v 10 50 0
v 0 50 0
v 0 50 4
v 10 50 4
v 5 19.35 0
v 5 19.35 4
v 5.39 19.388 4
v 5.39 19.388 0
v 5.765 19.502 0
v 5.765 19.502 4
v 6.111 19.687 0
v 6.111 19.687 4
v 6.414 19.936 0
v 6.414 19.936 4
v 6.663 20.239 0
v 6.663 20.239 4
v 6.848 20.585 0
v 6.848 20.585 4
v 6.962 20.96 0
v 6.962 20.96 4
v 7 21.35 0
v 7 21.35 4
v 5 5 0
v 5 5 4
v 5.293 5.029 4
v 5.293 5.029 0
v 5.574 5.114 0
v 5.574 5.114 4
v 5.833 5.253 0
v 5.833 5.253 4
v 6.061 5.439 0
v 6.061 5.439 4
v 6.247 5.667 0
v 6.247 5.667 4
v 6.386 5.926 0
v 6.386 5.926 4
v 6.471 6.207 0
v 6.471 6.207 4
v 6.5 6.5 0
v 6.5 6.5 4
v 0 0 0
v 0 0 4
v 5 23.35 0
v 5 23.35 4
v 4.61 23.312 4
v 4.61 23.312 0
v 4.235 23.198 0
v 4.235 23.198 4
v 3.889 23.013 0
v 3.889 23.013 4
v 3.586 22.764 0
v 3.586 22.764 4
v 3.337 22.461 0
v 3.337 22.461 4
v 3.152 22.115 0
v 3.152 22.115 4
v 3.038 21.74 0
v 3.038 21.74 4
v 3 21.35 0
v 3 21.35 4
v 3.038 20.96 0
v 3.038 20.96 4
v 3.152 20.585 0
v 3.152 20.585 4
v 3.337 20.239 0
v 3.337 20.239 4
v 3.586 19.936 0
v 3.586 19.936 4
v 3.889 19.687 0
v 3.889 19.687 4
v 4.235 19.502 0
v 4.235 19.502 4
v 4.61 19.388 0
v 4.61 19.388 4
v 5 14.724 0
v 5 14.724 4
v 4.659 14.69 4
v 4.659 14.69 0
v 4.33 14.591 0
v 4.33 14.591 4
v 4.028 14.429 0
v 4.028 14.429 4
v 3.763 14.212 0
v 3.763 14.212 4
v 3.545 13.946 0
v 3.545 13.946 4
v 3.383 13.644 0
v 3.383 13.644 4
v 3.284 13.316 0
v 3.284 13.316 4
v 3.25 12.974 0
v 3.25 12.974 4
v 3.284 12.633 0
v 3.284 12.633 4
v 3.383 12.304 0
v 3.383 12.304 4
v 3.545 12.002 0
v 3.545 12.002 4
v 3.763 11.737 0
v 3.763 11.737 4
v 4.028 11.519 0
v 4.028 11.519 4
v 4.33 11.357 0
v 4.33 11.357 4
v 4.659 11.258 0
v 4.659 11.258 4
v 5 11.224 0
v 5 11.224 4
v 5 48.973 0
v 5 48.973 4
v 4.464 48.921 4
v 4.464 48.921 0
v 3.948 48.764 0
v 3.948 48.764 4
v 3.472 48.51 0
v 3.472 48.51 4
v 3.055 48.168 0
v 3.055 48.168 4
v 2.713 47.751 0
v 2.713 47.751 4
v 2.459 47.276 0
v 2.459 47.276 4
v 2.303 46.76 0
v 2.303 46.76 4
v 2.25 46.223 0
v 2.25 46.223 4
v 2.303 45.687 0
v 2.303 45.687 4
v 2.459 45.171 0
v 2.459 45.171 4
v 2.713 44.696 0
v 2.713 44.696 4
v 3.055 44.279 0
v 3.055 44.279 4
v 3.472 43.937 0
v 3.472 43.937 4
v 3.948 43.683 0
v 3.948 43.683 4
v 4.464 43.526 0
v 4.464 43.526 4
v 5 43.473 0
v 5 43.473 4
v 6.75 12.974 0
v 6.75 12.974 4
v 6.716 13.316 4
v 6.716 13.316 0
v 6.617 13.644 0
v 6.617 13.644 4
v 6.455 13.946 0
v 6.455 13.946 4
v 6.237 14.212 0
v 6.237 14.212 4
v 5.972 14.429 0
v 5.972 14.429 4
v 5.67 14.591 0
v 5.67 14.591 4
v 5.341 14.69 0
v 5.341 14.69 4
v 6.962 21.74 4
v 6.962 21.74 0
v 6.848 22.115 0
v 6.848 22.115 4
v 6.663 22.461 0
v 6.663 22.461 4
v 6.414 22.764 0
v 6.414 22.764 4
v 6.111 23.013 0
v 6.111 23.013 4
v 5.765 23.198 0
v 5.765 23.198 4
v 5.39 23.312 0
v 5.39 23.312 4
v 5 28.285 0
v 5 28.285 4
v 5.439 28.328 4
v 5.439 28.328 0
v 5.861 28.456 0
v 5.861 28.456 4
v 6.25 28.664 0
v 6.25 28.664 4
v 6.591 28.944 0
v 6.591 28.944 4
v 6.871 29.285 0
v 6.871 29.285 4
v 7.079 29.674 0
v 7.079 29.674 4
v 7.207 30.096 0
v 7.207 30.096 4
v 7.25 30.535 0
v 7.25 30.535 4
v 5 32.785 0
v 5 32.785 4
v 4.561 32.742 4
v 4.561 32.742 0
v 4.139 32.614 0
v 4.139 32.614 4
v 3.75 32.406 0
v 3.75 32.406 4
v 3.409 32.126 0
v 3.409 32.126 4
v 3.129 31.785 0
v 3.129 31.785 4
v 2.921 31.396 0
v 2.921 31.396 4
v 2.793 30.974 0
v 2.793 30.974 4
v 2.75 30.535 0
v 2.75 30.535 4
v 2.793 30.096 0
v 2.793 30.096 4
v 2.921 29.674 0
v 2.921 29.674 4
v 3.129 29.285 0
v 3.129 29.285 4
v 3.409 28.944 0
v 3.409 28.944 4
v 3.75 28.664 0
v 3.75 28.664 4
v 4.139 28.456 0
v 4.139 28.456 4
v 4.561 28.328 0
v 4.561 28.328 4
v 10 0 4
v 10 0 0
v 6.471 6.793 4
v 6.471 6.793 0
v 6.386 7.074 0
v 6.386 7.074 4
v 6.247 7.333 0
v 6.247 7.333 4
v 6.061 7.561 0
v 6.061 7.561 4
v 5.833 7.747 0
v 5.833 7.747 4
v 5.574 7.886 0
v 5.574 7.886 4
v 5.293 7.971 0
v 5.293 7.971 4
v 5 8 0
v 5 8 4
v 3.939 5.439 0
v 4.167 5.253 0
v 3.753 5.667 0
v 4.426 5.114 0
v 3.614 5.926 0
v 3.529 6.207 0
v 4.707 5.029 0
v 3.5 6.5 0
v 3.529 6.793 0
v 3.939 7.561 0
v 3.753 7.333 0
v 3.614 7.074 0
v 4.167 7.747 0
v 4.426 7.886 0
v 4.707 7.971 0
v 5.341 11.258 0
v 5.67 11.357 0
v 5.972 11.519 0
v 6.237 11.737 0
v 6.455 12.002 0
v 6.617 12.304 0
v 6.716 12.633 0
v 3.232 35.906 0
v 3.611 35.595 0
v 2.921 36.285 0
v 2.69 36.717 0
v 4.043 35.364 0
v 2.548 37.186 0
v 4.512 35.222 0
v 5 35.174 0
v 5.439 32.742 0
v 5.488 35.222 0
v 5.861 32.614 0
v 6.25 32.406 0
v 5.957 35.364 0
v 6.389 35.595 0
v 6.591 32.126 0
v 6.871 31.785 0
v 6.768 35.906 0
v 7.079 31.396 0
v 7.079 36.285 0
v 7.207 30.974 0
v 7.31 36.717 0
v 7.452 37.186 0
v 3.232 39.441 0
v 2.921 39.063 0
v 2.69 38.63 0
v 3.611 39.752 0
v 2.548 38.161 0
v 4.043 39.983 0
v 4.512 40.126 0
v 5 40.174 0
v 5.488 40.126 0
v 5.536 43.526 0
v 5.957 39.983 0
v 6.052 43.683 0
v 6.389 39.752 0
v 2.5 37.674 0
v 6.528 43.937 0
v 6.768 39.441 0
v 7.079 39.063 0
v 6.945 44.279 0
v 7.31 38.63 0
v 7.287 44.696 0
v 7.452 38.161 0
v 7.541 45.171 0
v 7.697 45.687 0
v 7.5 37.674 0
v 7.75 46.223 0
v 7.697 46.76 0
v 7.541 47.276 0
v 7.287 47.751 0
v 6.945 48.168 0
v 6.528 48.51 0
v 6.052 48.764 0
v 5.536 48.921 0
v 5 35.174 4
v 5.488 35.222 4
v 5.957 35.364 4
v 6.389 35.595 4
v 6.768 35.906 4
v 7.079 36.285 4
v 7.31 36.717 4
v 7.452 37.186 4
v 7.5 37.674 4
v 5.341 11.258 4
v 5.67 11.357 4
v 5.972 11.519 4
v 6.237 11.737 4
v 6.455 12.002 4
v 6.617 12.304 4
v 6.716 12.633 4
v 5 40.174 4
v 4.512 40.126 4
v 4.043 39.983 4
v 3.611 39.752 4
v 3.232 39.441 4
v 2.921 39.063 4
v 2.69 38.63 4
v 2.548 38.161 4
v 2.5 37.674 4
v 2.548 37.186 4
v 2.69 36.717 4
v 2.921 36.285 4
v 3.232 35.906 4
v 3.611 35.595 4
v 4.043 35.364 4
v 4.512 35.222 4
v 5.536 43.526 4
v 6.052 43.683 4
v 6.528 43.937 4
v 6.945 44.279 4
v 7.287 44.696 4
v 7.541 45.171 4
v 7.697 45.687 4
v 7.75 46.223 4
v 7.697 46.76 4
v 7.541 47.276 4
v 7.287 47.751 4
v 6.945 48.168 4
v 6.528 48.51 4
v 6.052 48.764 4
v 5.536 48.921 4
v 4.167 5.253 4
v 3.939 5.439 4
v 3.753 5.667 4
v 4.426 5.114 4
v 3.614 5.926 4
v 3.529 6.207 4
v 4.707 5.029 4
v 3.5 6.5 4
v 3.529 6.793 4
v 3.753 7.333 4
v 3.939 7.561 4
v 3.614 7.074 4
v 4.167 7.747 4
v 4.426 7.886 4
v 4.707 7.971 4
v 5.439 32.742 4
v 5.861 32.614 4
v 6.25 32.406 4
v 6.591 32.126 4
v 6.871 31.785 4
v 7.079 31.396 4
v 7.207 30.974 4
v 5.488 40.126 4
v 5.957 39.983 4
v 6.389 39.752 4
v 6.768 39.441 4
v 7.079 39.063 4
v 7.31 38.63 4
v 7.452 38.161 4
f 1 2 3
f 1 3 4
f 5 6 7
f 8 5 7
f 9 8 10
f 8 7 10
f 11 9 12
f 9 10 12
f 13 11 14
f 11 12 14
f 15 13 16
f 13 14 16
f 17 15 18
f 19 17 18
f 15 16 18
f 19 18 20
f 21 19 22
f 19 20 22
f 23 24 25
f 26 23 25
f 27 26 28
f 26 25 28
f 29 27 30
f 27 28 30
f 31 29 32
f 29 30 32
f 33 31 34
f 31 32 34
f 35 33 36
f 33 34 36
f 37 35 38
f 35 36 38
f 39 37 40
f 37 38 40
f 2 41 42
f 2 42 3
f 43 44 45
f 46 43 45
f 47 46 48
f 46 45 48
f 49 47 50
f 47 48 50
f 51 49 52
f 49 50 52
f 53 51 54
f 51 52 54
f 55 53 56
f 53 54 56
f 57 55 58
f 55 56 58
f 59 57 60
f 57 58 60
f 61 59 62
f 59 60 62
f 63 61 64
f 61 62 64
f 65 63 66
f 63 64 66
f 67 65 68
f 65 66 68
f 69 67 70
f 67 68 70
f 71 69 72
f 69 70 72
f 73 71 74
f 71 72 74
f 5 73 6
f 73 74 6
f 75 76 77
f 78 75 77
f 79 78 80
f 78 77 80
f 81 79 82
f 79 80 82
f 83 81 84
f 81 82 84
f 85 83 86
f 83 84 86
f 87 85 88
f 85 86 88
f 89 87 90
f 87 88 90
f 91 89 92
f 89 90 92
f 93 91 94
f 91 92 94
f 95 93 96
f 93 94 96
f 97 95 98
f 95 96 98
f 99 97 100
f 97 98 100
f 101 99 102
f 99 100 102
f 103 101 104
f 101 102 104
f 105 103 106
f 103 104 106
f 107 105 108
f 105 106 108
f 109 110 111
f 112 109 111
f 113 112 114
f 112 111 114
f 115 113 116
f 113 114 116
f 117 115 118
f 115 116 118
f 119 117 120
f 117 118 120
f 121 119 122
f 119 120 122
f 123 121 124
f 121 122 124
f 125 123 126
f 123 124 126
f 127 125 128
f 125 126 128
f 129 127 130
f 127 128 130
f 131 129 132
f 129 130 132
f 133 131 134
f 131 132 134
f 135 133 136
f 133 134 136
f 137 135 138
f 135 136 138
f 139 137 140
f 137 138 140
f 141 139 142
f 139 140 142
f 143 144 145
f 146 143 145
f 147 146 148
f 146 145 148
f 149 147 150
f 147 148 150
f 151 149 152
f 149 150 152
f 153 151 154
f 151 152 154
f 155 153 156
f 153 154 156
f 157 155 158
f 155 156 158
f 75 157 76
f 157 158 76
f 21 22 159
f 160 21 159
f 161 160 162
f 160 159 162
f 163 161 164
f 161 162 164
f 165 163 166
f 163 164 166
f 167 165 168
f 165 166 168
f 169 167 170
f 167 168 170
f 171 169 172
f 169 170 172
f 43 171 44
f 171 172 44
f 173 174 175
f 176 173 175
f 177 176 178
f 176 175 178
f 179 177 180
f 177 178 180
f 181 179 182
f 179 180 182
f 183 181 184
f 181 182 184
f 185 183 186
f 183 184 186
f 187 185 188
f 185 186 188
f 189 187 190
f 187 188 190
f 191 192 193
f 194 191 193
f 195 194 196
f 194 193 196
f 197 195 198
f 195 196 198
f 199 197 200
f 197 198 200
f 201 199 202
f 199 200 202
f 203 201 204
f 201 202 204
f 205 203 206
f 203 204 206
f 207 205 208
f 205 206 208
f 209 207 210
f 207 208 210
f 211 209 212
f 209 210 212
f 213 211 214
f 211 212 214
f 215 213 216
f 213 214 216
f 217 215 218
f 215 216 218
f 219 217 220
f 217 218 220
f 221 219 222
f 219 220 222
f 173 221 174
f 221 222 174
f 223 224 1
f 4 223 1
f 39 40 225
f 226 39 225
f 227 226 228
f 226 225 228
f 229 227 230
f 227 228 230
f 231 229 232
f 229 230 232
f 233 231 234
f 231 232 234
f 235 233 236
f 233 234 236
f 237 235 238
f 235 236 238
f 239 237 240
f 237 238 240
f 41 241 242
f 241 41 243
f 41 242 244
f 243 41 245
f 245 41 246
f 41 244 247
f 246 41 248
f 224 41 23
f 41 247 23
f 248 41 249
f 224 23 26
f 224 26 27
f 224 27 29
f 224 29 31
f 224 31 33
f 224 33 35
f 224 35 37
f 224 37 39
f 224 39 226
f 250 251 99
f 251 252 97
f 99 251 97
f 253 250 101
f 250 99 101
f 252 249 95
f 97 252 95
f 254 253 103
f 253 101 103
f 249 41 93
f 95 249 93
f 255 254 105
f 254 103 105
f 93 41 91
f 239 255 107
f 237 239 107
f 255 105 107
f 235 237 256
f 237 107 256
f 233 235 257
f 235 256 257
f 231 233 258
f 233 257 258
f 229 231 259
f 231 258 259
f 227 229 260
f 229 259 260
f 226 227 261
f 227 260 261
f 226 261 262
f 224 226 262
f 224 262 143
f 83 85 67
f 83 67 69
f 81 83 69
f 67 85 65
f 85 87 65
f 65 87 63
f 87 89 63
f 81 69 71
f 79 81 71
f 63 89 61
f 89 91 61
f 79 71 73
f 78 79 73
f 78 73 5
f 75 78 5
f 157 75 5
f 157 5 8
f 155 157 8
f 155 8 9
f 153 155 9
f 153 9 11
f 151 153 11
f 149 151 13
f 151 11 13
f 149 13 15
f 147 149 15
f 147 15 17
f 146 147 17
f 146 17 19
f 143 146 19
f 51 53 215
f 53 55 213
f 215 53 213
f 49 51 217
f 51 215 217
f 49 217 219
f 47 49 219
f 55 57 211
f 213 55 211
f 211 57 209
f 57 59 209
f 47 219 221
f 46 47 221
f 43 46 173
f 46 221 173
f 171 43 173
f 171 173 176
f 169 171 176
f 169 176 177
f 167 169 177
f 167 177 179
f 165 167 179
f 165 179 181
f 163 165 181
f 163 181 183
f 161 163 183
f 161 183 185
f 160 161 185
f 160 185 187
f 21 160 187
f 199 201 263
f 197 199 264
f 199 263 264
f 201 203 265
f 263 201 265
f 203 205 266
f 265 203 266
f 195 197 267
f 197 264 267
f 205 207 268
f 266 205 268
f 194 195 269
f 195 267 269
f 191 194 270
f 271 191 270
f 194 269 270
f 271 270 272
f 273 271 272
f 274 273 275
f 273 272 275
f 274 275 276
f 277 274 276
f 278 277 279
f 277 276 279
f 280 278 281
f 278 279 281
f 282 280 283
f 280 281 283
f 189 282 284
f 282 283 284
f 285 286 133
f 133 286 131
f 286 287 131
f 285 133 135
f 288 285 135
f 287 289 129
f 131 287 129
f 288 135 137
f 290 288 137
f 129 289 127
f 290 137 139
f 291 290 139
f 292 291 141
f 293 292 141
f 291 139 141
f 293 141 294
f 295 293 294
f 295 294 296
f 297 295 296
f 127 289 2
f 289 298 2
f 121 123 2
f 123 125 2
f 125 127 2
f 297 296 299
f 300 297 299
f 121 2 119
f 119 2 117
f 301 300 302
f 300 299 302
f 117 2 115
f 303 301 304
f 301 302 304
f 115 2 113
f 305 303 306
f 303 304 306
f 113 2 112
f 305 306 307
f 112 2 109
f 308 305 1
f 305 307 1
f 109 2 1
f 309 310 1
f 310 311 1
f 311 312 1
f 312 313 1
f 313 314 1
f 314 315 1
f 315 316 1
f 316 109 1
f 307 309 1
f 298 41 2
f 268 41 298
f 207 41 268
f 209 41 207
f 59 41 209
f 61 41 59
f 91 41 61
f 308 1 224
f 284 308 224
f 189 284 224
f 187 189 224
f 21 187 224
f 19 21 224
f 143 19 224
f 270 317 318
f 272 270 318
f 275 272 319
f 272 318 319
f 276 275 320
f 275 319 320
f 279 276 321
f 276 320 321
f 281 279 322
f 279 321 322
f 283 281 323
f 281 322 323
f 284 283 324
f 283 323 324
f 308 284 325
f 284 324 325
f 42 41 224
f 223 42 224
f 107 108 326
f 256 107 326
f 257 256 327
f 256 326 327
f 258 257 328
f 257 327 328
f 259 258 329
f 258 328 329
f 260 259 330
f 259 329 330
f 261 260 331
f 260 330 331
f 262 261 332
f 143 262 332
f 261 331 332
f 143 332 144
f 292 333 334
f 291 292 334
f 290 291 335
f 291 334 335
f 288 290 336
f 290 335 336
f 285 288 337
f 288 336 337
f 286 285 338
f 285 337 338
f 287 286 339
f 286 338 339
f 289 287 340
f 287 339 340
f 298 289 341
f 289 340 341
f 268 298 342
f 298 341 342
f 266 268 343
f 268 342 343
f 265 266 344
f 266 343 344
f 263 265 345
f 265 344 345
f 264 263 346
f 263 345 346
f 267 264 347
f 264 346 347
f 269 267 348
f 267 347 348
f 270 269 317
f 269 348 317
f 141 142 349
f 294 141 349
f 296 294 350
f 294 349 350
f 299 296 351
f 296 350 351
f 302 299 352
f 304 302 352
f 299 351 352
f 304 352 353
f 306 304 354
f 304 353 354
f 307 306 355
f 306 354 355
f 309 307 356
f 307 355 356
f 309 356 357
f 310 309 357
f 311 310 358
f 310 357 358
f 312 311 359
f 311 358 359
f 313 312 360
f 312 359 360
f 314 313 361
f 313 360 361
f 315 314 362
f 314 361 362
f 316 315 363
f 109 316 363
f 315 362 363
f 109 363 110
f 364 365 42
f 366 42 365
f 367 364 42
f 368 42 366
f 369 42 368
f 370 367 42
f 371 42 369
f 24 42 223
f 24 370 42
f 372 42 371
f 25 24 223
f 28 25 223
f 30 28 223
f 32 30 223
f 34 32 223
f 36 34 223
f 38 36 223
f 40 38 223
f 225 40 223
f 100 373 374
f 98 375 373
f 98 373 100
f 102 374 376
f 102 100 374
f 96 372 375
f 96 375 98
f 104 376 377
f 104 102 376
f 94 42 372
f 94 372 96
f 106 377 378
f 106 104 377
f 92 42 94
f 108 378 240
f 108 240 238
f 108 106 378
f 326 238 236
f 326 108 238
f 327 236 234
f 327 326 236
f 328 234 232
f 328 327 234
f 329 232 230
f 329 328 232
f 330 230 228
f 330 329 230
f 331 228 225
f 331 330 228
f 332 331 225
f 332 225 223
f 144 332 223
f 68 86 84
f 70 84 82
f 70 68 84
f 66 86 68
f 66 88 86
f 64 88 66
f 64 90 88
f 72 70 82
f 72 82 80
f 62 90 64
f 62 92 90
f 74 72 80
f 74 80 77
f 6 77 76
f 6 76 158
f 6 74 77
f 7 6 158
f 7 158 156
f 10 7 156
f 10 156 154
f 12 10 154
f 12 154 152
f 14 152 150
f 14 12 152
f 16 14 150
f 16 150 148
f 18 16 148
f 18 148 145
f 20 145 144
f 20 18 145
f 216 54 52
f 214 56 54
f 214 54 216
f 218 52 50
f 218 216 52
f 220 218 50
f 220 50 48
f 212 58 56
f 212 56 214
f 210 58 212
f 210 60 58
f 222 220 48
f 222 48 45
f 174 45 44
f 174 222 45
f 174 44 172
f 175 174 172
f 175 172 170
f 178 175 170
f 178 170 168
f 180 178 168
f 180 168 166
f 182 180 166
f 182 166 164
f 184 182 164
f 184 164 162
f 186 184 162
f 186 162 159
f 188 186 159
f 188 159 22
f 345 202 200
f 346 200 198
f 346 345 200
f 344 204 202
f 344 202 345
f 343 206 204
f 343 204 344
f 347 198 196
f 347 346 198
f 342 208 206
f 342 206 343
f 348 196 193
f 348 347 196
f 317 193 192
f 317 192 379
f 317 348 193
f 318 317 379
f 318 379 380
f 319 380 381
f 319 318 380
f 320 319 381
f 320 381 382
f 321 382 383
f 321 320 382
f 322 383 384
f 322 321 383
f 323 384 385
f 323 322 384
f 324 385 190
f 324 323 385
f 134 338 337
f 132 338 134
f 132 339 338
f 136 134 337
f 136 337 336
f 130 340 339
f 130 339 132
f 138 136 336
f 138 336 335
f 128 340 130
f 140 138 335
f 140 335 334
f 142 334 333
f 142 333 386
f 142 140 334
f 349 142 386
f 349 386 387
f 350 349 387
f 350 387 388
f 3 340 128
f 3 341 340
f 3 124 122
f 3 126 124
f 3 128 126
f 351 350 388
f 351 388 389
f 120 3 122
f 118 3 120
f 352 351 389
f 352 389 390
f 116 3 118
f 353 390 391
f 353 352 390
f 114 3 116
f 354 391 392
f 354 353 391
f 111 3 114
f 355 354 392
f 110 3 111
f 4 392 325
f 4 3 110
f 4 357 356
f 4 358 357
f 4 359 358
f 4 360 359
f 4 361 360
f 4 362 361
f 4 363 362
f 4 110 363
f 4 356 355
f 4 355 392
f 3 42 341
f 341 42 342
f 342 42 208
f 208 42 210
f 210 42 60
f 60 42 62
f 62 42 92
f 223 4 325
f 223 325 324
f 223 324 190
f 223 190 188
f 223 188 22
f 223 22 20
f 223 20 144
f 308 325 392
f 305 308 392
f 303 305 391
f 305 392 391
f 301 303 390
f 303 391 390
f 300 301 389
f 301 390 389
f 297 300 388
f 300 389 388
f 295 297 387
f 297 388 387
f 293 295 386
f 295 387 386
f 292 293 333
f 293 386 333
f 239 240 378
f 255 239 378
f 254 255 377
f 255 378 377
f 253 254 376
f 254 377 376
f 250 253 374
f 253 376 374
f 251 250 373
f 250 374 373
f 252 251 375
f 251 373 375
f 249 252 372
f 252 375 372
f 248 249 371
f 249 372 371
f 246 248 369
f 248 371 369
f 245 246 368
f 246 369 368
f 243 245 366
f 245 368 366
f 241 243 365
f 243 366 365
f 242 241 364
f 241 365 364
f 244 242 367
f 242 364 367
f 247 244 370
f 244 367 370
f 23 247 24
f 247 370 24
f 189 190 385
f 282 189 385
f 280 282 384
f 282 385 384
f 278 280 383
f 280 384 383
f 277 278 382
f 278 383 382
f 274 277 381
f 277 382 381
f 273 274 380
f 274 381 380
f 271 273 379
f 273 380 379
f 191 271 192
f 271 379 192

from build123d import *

# Parameters (mm, degrees)
F0_W     = 10
F0_H     = 50
F1_DEPTH = 4
F3_DEPTH = 4.001


with BuildPart() as f1:
    # F0 (on Top) → F1 (new body)
    with BuildSketch(Plane.XY):
        with Locations((5, 25)):
            Rectangle(F0_W, F0_H)
    extrude(amount=F1_DEPTH)

    # F2 (on face) → F3 (cut, through all)
    with BuildSketch(Plane.XY.offset(4)):
        with BuildLine():
            ThreePointArc((5, 5), (6.06066, 5.43934), (6.5, 6.5))
            ThreePointArc((6.5, 6.5), (6.06066, 7.56066), (5, 8))
            Line((5, 8), (5, 5))
        make_face()
        with BuildLine():
            ThreePointArc((5, 48.97335), (2.25, 46.22335), (5, 43.47335))
            Line((5, 43.47335), (5, 48.97335))
        make_face()
        with BuildLine():
            Line((5, 48.97335), (5, 43.47335))
            ThreePointArc((5, 43.47335), (6.944544, 44.278806), (7.75, 46.22335))
            ThreePointArc((7.75, 46.22335), (6.944544, 48.167894), (5, 48.97335))
        make_face()
        with BuildLine():
            ThreePointArc((5, 40.173719), (2.5, 37.673719), (5, 35.173719))
            Line((5, 35.173719), (5, 40.173719))
        make_face()
        with BuildLine():
            Line((5, 40.173719), (5, 35.173719))
            ThreePointArc((5, 35.173719), (6.767767, 35.905952), (7.5, 37.673719))
            ThreePointArc((7.5, 37.673719), (6.767767, 39.441486), (5, 40.173719))
        make_face()
        with BuildLine():
            ThreePointArc((5, 32.784836), (2.75, 30.534836), (5, 28.284836))
            Line((5, 28.284836), (5, 32.784836))
        make_face()
        with BuildLine():
            Line((5, 32.784836), (5, 28.284836))
            ThreePointArc((5, 28.284836), (6.59099, 28.943845), (7.25, 30.534836))
            ThreePointArc((7.25, 30.534836), (6.59099, 32.125826), (5, 32.784836))
        make_face()
        with BuildLine():
            ThreePointArc((5, 23.35), (3, 21.35), (5, 19.35))
            Line((5, 19.35), (5, 23.35))
        make_face()
        with BuildLine():
            Line((5, 23.35), (5, 19.35))
            ThreePointArc((5, 19.35), (6.414214, 19.935786), (7, 21.35))
            ThreePointArc((7, 21.35), (6.414214, 22.764214), (5, 23.35))
        make_face()
        with BuildLine():
            ThreePointArc((5, 14.724094), (3.25, 12.974094), (5, 11.224094))
            Line((5, 11.224094), (5, 14.724094))
        make_face()
        with BuildLine():
            Line((5, 14.724094), (5, 11.224094))
            ThreePointArc((5, 11.224094), (6.237437, 11.736657), (6.75, 12.974094))
            ThreePointArc((6.75, 12.974094), (6.237437, 14.211531), (5, 14.724094))
        make_face()
        with BuildLine():
            Line((5, 5), (5, 8))
            ThreePointArc((5, 8), (3.5, 6.5), (5, 5))
        make_face()
    extrude(amount=-F3_DEPTH, mode=Mode.SUBTRACT)


solid = f1.part
